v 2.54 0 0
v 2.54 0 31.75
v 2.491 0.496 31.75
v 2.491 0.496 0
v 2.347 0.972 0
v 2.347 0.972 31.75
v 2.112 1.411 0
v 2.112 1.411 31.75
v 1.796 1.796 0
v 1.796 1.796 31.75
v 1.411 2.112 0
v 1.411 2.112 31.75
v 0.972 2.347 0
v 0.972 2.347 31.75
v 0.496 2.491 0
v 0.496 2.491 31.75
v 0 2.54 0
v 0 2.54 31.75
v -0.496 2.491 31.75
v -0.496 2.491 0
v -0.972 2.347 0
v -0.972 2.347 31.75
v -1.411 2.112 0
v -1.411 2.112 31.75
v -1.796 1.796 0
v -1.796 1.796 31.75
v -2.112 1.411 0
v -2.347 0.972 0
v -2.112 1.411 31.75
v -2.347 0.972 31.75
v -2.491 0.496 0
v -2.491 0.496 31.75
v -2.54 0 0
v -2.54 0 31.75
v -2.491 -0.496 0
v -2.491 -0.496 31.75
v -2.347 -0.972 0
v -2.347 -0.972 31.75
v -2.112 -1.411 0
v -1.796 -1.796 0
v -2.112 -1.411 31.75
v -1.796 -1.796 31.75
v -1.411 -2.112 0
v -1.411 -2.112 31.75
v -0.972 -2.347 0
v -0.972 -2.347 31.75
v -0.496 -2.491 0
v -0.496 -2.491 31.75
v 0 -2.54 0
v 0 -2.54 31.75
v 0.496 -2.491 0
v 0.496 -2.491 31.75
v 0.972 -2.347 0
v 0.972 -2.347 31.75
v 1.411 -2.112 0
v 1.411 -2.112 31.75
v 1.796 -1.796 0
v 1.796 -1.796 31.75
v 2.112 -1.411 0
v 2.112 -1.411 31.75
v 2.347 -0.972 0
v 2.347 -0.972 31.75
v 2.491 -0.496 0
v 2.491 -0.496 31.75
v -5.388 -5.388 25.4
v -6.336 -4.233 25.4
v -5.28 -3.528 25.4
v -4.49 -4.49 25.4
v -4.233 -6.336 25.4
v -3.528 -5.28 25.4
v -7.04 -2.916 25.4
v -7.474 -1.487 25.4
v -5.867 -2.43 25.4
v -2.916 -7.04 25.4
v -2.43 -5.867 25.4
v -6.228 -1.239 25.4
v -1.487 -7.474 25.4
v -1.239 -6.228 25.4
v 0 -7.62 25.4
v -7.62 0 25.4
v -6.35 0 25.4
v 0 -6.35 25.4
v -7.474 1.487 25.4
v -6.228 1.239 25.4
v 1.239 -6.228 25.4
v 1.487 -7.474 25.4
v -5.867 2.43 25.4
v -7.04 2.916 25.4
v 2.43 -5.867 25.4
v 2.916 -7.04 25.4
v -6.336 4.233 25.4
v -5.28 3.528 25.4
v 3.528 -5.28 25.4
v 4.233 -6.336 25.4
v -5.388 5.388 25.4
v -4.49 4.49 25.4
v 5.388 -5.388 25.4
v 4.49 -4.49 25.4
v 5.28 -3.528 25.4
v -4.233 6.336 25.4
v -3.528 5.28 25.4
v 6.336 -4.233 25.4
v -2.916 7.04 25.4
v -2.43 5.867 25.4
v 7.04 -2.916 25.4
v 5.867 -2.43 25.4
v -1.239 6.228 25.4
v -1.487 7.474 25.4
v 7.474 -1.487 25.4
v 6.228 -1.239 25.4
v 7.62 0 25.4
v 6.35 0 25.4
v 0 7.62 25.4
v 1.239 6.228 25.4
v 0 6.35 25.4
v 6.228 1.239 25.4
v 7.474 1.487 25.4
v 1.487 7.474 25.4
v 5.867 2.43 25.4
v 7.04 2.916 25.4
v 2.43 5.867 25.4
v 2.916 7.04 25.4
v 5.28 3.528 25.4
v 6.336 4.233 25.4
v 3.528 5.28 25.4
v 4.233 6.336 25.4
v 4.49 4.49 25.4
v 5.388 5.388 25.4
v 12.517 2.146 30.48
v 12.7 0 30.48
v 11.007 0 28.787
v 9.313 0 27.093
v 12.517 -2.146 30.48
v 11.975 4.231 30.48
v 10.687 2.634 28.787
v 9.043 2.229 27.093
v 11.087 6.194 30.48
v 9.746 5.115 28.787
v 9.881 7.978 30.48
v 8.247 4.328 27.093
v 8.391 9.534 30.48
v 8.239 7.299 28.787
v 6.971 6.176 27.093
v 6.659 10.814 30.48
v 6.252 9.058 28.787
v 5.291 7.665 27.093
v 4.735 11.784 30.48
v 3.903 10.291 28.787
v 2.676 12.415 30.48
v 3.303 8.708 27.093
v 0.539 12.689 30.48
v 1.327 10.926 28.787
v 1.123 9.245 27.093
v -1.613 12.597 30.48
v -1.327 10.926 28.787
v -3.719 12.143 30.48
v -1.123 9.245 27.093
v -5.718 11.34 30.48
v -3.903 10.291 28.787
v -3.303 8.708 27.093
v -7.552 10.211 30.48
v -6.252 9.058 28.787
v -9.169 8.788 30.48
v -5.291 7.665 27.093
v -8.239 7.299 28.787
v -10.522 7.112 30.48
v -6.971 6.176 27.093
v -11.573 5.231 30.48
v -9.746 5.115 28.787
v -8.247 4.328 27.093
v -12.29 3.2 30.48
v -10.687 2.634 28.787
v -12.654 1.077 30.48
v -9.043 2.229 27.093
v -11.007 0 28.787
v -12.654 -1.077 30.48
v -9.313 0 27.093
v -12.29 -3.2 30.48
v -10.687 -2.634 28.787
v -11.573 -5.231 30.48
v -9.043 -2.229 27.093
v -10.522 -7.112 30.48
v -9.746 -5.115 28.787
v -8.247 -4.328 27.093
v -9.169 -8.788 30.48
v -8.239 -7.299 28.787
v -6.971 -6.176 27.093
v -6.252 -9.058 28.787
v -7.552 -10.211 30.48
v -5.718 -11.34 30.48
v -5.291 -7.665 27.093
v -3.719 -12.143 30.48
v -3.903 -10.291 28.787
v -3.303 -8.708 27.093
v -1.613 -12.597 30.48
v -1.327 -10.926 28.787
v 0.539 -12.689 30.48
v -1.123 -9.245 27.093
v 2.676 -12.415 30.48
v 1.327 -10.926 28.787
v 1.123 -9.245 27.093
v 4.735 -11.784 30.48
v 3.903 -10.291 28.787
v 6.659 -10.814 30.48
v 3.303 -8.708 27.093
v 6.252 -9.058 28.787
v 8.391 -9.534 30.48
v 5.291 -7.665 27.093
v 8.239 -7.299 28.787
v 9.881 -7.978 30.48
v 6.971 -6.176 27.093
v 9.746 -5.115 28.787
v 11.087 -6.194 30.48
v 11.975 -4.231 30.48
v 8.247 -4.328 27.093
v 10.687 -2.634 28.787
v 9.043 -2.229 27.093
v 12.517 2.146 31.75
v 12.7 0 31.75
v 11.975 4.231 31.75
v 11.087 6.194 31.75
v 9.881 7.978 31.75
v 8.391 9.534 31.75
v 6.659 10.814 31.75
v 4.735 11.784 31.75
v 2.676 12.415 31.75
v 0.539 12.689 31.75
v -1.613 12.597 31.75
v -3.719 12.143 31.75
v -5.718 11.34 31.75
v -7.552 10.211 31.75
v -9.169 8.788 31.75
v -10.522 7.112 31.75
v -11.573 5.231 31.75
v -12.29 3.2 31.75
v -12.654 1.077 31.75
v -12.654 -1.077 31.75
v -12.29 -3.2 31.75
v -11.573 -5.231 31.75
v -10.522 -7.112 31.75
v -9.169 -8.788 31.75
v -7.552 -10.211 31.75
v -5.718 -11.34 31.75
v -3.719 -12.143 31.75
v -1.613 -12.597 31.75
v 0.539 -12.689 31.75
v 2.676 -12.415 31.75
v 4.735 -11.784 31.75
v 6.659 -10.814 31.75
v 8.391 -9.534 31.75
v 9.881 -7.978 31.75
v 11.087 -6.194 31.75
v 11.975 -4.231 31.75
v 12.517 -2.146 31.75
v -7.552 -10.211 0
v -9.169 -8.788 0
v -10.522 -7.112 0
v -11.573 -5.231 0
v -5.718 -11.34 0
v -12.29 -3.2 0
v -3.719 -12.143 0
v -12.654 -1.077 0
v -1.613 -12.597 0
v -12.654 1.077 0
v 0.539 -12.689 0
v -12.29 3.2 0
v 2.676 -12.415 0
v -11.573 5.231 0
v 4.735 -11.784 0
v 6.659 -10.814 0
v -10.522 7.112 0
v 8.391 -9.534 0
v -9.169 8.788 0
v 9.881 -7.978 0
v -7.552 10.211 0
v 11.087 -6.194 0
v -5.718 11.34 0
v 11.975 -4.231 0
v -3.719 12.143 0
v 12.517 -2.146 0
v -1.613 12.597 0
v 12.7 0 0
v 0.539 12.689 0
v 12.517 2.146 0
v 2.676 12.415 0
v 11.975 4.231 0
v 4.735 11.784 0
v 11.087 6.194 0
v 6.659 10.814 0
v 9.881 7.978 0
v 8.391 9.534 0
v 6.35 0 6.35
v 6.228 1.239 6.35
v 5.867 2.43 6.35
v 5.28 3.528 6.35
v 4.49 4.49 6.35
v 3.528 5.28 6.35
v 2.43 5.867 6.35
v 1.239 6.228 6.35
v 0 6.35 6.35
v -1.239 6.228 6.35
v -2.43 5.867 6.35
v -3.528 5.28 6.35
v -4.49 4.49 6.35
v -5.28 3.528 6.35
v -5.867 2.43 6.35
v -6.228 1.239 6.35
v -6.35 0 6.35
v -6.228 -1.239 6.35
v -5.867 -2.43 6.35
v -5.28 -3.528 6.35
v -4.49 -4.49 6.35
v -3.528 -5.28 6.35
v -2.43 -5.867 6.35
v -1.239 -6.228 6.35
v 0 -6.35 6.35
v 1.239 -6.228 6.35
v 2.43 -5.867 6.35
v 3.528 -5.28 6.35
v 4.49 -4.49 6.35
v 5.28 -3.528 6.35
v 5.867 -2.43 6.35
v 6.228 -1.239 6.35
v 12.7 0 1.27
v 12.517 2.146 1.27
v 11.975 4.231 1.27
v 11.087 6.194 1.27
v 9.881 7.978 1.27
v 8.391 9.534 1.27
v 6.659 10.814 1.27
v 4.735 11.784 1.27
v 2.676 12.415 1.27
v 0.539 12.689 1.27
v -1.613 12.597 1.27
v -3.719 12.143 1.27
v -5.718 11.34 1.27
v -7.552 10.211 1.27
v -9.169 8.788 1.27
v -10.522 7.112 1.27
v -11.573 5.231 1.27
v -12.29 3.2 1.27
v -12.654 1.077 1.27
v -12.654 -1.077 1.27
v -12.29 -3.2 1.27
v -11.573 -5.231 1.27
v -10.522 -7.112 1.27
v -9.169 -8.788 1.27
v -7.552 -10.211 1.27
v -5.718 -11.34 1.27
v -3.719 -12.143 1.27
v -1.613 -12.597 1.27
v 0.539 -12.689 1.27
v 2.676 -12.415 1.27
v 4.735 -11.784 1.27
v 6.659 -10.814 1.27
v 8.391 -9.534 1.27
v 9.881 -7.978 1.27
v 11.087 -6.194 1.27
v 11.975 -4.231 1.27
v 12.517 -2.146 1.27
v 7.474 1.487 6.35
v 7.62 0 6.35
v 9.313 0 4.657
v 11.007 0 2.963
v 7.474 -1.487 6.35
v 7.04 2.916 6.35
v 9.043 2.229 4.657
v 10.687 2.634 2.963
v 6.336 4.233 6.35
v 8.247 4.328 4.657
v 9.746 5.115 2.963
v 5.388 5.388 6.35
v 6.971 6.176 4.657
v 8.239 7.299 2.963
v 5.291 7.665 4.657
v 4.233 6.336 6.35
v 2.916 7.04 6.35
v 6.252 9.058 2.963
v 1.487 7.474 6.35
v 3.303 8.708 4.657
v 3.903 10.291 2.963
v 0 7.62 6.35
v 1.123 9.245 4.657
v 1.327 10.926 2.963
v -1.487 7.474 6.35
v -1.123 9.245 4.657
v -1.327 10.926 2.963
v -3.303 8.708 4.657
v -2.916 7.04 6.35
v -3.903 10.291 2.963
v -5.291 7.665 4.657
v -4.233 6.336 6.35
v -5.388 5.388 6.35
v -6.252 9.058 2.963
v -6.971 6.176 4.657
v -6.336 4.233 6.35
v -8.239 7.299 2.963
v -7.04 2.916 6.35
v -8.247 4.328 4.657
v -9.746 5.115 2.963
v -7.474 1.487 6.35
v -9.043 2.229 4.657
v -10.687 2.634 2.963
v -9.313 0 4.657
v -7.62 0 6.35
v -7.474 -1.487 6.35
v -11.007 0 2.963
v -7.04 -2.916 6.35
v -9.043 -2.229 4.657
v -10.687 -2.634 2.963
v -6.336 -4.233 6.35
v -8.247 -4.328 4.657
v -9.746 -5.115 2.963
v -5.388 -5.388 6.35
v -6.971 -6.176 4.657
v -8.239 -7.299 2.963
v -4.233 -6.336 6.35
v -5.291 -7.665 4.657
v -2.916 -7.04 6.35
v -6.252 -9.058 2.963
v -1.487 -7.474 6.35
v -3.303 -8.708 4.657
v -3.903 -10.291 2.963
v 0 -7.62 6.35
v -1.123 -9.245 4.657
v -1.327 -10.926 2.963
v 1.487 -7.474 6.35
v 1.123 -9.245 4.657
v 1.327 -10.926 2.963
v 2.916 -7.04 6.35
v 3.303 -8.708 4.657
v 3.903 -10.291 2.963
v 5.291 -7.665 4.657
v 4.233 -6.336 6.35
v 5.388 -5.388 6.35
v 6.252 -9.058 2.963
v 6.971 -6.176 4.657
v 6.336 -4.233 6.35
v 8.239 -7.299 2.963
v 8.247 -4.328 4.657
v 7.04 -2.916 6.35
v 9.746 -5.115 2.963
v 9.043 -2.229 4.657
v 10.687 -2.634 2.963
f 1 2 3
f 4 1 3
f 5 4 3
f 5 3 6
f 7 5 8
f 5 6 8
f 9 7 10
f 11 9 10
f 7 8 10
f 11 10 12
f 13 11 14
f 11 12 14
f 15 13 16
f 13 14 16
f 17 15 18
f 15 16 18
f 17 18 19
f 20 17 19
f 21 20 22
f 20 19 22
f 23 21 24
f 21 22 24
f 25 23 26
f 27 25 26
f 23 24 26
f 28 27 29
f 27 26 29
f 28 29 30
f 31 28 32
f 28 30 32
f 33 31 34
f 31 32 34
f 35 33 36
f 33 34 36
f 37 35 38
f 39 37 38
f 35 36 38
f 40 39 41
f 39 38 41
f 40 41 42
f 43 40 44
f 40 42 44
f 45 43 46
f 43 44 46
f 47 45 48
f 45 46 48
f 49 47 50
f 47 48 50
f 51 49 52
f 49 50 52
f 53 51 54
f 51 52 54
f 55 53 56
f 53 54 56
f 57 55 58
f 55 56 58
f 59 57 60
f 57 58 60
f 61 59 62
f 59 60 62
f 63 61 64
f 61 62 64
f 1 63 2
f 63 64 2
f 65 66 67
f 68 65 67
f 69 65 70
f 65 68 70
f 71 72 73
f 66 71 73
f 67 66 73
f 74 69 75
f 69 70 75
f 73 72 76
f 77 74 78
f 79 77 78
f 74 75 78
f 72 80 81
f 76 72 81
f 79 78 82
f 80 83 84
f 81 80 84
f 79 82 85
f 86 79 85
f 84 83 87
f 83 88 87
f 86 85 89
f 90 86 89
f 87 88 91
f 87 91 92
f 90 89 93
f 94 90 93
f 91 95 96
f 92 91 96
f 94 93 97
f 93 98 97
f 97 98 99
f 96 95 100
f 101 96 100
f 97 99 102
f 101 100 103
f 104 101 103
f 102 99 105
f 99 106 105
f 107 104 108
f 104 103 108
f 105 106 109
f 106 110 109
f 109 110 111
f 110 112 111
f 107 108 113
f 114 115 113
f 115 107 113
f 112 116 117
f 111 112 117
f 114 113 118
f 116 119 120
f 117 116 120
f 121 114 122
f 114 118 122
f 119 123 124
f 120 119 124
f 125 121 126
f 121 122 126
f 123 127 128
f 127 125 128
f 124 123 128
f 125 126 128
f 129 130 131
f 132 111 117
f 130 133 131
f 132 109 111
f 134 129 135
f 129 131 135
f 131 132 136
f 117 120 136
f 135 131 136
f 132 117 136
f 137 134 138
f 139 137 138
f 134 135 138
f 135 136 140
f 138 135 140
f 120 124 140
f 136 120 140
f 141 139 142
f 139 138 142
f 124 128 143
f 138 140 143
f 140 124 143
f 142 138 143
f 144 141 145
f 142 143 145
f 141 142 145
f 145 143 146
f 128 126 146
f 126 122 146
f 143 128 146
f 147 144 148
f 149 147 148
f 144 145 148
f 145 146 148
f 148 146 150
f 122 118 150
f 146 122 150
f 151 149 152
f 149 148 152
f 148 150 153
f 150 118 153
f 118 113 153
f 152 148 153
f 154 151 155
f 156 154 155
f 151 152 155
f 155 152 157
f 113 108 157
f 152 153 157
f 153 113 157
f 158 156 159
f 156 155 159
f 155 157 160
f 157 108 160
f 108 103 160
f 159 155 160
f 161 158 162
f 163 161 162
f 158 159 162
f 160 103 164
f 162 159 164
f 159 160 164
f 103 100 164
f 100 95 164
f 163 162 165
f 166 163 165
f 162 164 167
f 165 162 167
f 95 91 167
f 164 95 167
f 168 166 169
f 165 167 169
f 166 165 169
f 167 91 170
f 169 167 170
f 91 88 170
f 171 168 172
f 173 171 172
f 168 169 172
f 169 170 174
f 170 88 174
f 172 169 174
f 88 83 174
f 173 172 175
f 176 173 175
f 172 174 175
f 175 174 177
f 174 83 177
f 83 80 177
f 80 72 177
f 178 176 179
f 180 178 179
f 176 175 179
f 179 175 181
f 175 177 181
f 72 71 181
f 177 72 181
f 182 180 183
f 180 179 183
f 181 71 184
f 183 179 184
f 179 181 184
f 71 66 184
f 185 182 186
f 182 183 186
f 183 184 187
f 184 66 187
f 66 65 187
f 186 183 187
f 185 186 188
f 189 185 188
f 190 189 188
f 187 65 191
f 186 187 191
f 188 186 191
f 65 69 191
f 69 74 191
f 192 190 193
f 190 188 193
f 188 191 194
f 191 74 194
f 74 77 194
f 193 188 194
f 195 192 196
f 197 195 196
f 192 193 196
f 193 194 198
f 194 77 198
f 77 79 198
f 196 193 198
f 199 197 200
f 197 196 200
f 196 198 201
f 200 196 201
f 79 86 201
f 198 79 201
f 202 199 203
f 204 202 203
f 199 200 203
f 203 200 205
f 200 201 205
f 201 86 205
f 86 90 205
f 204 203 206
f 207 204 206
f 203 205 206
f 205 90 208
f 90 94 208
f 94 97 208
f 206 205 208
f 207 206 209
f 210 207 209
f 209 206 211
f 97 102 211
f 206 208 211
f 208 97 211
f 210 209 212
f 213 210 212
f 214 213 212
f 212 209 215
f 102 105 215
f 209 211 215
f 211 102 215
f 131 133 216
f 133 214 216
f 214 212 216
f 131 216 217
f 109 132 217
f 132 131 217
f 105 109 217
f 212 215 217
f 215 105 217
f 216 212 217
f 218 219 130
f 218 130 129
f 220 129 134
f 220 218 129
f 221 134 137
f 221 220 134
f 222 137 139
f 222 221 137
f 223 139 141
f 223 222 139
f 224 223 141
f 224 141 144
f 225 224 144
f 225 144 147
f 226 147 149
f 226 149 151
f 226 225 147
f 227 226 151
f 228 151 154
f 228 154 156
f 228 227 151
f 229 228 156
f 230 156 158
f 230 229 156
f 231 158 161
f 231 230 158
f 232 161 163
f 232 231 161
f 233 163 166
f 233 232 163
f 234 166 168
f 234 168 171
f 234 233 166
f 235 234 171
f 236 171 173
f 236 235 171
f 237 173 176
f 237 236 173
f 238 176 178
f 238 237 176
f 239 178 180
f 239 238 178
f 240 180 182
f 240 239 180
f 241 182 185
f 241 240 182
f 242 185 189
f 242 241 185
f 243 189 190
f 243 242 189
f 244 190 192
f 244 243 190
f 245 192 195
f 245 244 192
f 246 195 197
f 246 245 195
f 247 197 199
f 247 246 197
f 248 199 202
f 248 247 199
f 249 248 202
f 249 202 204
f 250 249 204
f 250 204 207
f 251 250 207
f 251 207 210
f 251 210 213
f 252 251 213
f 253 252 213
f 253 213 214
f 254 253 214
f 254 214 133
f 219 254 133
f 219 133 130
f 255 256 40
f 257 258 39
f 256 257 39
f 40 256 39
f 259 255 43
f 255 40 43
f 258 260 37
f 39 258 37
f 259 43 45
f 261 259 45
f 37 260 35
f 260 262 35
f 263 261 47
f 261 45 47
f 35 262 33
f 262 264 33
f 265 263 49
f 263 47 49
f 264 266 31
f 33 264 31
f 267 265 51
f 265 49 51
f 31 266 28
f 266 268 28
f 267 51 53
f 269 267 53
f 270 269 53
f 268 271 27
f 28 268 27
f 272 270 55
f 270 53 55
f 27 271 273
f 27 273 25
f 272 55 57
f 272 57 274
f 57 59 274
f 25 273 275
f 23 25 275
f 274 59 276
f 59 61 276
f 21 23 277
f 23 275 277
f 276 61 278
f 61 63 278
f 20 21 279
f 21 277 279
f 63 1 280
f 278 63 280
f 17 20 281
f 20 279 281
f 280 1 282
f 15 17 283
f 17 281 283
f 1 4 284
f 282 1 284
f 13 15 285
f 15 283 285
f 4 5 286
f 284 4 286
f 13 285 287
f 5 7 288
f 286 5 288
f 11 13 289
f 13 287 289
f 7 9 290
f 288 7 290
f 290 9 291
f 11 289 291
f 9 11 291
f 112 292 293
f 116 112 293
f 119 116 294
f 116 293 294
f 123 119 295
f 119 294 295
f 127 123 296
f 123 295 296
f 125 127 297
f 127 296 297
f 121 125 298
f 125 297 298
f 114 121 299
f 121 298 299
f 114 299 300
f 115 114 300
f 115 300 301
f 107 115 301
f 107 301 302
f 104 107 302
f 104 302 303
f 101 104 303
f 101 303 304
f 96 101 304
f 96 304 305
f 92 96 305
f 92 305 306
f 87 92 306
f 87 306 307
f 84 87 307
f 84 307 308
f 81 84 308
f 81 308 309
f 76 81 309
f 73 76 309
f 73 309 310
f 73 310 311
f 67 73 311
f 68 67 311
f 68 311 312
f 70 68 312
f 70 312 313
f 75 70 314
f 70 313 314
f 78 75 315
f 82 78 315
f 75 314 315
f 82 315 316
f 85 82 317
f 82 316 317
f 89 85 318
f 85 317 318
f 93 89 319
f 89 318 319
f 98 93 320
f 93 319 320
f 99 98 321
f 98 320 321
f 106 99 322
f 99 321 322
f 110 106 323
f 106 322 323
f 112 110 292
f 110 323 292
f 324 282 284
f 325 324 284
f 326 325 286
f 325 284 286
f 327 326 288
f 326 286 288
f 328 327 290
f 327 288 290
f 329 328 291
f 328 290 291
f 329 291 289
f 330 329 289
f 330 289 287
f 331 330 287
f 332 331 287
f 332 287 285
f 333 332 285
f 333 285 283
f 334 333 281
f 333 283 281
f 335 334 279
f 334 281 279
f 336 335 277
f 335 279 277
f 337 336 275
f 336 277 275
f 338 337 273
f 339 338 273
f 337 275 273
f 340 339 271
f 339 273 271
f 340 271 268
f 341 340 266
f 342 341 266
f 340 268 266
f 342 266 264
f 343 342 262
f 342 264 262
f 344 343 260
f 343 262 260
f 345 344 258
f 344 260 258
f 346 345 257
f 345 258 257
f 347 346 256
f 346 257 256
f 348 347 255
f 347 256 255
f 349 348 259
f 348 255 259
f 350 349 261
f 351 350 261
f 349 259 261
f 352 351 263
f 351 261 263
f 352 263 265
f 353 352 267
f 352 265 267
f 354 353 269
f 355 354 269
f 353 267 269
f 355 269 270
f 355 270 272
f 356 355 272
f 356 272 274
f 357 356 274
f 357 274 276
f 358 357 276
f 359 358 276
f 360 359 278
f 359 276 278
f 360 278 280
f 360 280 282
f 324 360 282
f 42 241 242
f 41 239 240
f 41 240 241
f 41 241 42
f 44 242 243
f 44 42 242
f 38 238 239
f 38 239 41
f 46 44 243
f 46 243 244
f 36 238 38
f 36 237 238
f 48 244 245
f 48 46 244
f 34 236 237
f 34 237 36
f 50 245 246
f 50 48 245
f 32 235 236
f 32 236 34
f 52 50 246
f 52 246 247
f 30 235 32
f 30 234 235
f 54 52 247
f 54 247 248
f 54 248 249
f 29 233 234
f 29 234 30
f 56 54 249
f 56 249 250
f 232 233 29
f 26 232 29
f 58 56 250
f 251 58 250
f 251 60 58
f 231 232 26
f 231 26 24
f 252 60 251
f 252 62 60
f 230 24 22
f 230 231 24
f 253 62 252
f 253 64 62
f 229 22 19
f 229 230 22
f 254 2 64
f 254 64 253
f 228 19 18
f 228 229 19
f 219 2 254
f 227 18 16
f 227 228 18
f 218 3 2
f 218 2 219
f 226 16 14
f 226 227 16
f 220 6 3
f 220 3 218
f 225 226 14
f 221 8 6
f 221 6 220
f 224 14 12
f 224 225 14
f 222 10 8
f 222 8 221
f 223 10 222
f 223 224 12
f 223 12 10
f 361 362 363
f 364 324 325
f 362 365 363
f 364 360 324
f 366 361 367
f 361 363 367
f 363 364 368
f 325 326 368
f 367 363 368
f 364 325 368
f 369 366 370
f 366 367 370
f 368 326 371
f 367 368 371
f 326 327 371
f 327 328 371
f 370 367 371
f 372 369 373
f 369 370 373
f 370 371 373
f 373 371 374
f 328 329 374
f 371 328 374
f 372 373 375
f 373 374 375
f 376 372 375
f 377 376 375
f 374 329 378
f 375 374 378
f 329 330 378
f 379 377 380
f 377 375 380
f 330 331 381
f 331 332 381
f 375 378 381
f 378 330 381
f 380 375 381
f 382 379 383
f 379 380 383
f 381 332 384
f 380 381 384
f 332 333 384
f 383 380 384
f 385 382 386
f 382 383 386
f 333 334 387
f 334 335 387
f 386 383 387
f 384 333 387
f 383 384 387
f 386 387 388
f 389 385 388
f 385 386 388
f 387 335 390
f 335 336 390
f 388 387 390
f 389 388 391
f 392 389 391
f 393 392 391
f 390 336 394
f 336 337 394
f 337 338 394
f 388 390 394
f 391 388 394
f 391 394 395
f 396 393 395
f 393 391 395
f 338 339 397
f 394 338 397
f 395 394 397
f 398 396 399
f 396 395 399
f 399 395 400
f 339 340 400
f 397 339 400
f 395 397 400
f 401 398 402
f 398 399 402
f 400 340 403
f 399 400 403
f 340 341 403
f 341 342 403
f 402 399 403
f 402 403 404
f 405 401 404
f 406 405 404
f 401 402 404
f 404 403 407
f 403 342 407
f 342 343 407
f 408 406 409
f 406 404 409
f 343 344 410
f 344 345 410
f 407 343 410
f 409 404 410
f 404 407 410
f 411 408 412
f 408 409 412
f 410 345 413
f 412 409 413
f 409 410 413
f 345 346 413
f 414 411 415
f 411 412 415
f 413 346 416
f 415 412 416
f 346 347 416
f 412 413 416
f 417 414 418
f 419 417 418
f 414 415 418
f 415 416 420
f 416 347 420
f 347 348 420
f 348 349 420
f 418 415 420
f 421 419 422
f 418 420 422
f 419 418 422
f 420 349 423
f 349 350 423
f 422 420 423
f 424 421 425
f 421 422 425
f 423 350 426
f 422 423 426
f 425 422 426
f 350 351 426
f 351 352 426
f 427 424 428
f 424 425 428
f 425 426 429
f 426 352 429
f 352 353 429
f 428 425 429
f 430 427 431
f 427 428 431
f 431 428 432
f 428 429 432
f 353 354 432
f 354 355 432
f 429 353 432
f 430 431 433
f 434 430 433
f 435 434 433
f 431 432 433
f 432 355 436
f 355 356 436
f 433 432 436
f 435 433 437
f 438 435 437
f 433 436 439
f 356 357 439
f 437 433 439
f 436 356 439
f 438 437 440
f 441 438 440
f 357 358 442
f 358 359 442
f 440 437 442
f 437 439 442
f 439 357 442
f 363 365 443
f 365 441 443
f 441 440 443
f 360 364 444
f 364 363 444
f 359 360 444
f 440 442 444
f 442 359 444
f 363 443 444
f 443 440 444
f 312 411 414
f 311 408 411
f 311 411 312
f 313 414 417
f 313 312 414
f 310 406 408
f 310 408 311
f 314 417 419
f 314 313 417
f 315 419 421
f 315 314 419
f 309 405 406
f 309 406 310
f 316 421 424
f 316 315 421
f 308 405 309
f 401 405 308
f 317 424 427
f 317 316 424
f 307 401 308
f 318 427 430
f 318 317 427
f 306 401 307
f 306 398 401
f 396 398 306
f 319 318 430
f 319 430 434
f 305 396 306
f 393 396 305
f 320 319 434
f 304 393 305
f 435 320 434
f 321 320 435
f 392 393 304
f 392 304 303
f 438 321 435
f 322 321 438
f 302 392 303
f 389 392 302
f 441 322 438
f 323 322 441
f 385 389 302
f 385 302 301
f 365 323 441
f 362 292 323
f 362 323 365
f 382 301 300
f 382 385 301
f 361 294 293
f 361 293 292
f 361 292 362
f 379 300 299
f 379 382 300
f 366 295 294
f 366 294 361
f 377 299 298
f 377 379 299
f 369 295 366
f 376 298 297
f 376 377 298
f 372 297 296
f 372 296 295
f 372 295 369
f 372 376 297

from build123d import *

# Parameters (mm, degrees)
F0_R     = 12.7
F1_DEPTH = 6.35
F2_R     = 6.35
F3_DEPTH = 25.4
F5_R     = 12.7
F6_DEPTH = 6.35
F7_R     = 2.54
F8_DEPTH = 31.75
F9_SIZE  = 5.08


# Not quite as in the source:
# - a pattern or mirror of a feature is missing from the dataset's text; its kind, count and spacing are read off the source's solid


with BuildPart() as f1:
    # F0 (on Top) → F1 (new body)
    with BuildSketch(Plane.XY):
        Circle(F0_R)
    extrude(amount=F1_DEPTH)


with BuildPart() as f1_copies_1:
    # F1_copies: instance of F1
    add(f1.part.mirror(Plane.XY.offset(15.875)))


with BuildPart() as f1_1:
    add(f1.part)

    add(f1_copies_1.part)  # F3 merges F1_copies_1
    # F2 (on Top) → F3 (join)
    with BuildSketch(Plane.XY):
        Circle(F2_R)
    extrude(amount=F3_DEPTH)

    # F5 (on face) → F6 (join)
    with BuildSketch(Plane.XY.offset(25.4)):
        Circle(F5_R)
    extrude(amount=F6_DEPTH)

    # F7 (on face) → F8 (cut)
    with BuildSketch(Plane.XY.offset(31.75)):
        Circle(F7_R)
    extrude(amount=-F8_DEPTH, mode=Mode.SUBTRACT)

    # F9
    f9_edges = [f1_1.edges().sort_by_distance(p)[0] for p in [
        (-12.7, 0, 25.4),
        (-12.7, 0, 6.35),
    ]]
    chamfer(f9_edges, length=F9_SIZE)


solid = f1_1.part
